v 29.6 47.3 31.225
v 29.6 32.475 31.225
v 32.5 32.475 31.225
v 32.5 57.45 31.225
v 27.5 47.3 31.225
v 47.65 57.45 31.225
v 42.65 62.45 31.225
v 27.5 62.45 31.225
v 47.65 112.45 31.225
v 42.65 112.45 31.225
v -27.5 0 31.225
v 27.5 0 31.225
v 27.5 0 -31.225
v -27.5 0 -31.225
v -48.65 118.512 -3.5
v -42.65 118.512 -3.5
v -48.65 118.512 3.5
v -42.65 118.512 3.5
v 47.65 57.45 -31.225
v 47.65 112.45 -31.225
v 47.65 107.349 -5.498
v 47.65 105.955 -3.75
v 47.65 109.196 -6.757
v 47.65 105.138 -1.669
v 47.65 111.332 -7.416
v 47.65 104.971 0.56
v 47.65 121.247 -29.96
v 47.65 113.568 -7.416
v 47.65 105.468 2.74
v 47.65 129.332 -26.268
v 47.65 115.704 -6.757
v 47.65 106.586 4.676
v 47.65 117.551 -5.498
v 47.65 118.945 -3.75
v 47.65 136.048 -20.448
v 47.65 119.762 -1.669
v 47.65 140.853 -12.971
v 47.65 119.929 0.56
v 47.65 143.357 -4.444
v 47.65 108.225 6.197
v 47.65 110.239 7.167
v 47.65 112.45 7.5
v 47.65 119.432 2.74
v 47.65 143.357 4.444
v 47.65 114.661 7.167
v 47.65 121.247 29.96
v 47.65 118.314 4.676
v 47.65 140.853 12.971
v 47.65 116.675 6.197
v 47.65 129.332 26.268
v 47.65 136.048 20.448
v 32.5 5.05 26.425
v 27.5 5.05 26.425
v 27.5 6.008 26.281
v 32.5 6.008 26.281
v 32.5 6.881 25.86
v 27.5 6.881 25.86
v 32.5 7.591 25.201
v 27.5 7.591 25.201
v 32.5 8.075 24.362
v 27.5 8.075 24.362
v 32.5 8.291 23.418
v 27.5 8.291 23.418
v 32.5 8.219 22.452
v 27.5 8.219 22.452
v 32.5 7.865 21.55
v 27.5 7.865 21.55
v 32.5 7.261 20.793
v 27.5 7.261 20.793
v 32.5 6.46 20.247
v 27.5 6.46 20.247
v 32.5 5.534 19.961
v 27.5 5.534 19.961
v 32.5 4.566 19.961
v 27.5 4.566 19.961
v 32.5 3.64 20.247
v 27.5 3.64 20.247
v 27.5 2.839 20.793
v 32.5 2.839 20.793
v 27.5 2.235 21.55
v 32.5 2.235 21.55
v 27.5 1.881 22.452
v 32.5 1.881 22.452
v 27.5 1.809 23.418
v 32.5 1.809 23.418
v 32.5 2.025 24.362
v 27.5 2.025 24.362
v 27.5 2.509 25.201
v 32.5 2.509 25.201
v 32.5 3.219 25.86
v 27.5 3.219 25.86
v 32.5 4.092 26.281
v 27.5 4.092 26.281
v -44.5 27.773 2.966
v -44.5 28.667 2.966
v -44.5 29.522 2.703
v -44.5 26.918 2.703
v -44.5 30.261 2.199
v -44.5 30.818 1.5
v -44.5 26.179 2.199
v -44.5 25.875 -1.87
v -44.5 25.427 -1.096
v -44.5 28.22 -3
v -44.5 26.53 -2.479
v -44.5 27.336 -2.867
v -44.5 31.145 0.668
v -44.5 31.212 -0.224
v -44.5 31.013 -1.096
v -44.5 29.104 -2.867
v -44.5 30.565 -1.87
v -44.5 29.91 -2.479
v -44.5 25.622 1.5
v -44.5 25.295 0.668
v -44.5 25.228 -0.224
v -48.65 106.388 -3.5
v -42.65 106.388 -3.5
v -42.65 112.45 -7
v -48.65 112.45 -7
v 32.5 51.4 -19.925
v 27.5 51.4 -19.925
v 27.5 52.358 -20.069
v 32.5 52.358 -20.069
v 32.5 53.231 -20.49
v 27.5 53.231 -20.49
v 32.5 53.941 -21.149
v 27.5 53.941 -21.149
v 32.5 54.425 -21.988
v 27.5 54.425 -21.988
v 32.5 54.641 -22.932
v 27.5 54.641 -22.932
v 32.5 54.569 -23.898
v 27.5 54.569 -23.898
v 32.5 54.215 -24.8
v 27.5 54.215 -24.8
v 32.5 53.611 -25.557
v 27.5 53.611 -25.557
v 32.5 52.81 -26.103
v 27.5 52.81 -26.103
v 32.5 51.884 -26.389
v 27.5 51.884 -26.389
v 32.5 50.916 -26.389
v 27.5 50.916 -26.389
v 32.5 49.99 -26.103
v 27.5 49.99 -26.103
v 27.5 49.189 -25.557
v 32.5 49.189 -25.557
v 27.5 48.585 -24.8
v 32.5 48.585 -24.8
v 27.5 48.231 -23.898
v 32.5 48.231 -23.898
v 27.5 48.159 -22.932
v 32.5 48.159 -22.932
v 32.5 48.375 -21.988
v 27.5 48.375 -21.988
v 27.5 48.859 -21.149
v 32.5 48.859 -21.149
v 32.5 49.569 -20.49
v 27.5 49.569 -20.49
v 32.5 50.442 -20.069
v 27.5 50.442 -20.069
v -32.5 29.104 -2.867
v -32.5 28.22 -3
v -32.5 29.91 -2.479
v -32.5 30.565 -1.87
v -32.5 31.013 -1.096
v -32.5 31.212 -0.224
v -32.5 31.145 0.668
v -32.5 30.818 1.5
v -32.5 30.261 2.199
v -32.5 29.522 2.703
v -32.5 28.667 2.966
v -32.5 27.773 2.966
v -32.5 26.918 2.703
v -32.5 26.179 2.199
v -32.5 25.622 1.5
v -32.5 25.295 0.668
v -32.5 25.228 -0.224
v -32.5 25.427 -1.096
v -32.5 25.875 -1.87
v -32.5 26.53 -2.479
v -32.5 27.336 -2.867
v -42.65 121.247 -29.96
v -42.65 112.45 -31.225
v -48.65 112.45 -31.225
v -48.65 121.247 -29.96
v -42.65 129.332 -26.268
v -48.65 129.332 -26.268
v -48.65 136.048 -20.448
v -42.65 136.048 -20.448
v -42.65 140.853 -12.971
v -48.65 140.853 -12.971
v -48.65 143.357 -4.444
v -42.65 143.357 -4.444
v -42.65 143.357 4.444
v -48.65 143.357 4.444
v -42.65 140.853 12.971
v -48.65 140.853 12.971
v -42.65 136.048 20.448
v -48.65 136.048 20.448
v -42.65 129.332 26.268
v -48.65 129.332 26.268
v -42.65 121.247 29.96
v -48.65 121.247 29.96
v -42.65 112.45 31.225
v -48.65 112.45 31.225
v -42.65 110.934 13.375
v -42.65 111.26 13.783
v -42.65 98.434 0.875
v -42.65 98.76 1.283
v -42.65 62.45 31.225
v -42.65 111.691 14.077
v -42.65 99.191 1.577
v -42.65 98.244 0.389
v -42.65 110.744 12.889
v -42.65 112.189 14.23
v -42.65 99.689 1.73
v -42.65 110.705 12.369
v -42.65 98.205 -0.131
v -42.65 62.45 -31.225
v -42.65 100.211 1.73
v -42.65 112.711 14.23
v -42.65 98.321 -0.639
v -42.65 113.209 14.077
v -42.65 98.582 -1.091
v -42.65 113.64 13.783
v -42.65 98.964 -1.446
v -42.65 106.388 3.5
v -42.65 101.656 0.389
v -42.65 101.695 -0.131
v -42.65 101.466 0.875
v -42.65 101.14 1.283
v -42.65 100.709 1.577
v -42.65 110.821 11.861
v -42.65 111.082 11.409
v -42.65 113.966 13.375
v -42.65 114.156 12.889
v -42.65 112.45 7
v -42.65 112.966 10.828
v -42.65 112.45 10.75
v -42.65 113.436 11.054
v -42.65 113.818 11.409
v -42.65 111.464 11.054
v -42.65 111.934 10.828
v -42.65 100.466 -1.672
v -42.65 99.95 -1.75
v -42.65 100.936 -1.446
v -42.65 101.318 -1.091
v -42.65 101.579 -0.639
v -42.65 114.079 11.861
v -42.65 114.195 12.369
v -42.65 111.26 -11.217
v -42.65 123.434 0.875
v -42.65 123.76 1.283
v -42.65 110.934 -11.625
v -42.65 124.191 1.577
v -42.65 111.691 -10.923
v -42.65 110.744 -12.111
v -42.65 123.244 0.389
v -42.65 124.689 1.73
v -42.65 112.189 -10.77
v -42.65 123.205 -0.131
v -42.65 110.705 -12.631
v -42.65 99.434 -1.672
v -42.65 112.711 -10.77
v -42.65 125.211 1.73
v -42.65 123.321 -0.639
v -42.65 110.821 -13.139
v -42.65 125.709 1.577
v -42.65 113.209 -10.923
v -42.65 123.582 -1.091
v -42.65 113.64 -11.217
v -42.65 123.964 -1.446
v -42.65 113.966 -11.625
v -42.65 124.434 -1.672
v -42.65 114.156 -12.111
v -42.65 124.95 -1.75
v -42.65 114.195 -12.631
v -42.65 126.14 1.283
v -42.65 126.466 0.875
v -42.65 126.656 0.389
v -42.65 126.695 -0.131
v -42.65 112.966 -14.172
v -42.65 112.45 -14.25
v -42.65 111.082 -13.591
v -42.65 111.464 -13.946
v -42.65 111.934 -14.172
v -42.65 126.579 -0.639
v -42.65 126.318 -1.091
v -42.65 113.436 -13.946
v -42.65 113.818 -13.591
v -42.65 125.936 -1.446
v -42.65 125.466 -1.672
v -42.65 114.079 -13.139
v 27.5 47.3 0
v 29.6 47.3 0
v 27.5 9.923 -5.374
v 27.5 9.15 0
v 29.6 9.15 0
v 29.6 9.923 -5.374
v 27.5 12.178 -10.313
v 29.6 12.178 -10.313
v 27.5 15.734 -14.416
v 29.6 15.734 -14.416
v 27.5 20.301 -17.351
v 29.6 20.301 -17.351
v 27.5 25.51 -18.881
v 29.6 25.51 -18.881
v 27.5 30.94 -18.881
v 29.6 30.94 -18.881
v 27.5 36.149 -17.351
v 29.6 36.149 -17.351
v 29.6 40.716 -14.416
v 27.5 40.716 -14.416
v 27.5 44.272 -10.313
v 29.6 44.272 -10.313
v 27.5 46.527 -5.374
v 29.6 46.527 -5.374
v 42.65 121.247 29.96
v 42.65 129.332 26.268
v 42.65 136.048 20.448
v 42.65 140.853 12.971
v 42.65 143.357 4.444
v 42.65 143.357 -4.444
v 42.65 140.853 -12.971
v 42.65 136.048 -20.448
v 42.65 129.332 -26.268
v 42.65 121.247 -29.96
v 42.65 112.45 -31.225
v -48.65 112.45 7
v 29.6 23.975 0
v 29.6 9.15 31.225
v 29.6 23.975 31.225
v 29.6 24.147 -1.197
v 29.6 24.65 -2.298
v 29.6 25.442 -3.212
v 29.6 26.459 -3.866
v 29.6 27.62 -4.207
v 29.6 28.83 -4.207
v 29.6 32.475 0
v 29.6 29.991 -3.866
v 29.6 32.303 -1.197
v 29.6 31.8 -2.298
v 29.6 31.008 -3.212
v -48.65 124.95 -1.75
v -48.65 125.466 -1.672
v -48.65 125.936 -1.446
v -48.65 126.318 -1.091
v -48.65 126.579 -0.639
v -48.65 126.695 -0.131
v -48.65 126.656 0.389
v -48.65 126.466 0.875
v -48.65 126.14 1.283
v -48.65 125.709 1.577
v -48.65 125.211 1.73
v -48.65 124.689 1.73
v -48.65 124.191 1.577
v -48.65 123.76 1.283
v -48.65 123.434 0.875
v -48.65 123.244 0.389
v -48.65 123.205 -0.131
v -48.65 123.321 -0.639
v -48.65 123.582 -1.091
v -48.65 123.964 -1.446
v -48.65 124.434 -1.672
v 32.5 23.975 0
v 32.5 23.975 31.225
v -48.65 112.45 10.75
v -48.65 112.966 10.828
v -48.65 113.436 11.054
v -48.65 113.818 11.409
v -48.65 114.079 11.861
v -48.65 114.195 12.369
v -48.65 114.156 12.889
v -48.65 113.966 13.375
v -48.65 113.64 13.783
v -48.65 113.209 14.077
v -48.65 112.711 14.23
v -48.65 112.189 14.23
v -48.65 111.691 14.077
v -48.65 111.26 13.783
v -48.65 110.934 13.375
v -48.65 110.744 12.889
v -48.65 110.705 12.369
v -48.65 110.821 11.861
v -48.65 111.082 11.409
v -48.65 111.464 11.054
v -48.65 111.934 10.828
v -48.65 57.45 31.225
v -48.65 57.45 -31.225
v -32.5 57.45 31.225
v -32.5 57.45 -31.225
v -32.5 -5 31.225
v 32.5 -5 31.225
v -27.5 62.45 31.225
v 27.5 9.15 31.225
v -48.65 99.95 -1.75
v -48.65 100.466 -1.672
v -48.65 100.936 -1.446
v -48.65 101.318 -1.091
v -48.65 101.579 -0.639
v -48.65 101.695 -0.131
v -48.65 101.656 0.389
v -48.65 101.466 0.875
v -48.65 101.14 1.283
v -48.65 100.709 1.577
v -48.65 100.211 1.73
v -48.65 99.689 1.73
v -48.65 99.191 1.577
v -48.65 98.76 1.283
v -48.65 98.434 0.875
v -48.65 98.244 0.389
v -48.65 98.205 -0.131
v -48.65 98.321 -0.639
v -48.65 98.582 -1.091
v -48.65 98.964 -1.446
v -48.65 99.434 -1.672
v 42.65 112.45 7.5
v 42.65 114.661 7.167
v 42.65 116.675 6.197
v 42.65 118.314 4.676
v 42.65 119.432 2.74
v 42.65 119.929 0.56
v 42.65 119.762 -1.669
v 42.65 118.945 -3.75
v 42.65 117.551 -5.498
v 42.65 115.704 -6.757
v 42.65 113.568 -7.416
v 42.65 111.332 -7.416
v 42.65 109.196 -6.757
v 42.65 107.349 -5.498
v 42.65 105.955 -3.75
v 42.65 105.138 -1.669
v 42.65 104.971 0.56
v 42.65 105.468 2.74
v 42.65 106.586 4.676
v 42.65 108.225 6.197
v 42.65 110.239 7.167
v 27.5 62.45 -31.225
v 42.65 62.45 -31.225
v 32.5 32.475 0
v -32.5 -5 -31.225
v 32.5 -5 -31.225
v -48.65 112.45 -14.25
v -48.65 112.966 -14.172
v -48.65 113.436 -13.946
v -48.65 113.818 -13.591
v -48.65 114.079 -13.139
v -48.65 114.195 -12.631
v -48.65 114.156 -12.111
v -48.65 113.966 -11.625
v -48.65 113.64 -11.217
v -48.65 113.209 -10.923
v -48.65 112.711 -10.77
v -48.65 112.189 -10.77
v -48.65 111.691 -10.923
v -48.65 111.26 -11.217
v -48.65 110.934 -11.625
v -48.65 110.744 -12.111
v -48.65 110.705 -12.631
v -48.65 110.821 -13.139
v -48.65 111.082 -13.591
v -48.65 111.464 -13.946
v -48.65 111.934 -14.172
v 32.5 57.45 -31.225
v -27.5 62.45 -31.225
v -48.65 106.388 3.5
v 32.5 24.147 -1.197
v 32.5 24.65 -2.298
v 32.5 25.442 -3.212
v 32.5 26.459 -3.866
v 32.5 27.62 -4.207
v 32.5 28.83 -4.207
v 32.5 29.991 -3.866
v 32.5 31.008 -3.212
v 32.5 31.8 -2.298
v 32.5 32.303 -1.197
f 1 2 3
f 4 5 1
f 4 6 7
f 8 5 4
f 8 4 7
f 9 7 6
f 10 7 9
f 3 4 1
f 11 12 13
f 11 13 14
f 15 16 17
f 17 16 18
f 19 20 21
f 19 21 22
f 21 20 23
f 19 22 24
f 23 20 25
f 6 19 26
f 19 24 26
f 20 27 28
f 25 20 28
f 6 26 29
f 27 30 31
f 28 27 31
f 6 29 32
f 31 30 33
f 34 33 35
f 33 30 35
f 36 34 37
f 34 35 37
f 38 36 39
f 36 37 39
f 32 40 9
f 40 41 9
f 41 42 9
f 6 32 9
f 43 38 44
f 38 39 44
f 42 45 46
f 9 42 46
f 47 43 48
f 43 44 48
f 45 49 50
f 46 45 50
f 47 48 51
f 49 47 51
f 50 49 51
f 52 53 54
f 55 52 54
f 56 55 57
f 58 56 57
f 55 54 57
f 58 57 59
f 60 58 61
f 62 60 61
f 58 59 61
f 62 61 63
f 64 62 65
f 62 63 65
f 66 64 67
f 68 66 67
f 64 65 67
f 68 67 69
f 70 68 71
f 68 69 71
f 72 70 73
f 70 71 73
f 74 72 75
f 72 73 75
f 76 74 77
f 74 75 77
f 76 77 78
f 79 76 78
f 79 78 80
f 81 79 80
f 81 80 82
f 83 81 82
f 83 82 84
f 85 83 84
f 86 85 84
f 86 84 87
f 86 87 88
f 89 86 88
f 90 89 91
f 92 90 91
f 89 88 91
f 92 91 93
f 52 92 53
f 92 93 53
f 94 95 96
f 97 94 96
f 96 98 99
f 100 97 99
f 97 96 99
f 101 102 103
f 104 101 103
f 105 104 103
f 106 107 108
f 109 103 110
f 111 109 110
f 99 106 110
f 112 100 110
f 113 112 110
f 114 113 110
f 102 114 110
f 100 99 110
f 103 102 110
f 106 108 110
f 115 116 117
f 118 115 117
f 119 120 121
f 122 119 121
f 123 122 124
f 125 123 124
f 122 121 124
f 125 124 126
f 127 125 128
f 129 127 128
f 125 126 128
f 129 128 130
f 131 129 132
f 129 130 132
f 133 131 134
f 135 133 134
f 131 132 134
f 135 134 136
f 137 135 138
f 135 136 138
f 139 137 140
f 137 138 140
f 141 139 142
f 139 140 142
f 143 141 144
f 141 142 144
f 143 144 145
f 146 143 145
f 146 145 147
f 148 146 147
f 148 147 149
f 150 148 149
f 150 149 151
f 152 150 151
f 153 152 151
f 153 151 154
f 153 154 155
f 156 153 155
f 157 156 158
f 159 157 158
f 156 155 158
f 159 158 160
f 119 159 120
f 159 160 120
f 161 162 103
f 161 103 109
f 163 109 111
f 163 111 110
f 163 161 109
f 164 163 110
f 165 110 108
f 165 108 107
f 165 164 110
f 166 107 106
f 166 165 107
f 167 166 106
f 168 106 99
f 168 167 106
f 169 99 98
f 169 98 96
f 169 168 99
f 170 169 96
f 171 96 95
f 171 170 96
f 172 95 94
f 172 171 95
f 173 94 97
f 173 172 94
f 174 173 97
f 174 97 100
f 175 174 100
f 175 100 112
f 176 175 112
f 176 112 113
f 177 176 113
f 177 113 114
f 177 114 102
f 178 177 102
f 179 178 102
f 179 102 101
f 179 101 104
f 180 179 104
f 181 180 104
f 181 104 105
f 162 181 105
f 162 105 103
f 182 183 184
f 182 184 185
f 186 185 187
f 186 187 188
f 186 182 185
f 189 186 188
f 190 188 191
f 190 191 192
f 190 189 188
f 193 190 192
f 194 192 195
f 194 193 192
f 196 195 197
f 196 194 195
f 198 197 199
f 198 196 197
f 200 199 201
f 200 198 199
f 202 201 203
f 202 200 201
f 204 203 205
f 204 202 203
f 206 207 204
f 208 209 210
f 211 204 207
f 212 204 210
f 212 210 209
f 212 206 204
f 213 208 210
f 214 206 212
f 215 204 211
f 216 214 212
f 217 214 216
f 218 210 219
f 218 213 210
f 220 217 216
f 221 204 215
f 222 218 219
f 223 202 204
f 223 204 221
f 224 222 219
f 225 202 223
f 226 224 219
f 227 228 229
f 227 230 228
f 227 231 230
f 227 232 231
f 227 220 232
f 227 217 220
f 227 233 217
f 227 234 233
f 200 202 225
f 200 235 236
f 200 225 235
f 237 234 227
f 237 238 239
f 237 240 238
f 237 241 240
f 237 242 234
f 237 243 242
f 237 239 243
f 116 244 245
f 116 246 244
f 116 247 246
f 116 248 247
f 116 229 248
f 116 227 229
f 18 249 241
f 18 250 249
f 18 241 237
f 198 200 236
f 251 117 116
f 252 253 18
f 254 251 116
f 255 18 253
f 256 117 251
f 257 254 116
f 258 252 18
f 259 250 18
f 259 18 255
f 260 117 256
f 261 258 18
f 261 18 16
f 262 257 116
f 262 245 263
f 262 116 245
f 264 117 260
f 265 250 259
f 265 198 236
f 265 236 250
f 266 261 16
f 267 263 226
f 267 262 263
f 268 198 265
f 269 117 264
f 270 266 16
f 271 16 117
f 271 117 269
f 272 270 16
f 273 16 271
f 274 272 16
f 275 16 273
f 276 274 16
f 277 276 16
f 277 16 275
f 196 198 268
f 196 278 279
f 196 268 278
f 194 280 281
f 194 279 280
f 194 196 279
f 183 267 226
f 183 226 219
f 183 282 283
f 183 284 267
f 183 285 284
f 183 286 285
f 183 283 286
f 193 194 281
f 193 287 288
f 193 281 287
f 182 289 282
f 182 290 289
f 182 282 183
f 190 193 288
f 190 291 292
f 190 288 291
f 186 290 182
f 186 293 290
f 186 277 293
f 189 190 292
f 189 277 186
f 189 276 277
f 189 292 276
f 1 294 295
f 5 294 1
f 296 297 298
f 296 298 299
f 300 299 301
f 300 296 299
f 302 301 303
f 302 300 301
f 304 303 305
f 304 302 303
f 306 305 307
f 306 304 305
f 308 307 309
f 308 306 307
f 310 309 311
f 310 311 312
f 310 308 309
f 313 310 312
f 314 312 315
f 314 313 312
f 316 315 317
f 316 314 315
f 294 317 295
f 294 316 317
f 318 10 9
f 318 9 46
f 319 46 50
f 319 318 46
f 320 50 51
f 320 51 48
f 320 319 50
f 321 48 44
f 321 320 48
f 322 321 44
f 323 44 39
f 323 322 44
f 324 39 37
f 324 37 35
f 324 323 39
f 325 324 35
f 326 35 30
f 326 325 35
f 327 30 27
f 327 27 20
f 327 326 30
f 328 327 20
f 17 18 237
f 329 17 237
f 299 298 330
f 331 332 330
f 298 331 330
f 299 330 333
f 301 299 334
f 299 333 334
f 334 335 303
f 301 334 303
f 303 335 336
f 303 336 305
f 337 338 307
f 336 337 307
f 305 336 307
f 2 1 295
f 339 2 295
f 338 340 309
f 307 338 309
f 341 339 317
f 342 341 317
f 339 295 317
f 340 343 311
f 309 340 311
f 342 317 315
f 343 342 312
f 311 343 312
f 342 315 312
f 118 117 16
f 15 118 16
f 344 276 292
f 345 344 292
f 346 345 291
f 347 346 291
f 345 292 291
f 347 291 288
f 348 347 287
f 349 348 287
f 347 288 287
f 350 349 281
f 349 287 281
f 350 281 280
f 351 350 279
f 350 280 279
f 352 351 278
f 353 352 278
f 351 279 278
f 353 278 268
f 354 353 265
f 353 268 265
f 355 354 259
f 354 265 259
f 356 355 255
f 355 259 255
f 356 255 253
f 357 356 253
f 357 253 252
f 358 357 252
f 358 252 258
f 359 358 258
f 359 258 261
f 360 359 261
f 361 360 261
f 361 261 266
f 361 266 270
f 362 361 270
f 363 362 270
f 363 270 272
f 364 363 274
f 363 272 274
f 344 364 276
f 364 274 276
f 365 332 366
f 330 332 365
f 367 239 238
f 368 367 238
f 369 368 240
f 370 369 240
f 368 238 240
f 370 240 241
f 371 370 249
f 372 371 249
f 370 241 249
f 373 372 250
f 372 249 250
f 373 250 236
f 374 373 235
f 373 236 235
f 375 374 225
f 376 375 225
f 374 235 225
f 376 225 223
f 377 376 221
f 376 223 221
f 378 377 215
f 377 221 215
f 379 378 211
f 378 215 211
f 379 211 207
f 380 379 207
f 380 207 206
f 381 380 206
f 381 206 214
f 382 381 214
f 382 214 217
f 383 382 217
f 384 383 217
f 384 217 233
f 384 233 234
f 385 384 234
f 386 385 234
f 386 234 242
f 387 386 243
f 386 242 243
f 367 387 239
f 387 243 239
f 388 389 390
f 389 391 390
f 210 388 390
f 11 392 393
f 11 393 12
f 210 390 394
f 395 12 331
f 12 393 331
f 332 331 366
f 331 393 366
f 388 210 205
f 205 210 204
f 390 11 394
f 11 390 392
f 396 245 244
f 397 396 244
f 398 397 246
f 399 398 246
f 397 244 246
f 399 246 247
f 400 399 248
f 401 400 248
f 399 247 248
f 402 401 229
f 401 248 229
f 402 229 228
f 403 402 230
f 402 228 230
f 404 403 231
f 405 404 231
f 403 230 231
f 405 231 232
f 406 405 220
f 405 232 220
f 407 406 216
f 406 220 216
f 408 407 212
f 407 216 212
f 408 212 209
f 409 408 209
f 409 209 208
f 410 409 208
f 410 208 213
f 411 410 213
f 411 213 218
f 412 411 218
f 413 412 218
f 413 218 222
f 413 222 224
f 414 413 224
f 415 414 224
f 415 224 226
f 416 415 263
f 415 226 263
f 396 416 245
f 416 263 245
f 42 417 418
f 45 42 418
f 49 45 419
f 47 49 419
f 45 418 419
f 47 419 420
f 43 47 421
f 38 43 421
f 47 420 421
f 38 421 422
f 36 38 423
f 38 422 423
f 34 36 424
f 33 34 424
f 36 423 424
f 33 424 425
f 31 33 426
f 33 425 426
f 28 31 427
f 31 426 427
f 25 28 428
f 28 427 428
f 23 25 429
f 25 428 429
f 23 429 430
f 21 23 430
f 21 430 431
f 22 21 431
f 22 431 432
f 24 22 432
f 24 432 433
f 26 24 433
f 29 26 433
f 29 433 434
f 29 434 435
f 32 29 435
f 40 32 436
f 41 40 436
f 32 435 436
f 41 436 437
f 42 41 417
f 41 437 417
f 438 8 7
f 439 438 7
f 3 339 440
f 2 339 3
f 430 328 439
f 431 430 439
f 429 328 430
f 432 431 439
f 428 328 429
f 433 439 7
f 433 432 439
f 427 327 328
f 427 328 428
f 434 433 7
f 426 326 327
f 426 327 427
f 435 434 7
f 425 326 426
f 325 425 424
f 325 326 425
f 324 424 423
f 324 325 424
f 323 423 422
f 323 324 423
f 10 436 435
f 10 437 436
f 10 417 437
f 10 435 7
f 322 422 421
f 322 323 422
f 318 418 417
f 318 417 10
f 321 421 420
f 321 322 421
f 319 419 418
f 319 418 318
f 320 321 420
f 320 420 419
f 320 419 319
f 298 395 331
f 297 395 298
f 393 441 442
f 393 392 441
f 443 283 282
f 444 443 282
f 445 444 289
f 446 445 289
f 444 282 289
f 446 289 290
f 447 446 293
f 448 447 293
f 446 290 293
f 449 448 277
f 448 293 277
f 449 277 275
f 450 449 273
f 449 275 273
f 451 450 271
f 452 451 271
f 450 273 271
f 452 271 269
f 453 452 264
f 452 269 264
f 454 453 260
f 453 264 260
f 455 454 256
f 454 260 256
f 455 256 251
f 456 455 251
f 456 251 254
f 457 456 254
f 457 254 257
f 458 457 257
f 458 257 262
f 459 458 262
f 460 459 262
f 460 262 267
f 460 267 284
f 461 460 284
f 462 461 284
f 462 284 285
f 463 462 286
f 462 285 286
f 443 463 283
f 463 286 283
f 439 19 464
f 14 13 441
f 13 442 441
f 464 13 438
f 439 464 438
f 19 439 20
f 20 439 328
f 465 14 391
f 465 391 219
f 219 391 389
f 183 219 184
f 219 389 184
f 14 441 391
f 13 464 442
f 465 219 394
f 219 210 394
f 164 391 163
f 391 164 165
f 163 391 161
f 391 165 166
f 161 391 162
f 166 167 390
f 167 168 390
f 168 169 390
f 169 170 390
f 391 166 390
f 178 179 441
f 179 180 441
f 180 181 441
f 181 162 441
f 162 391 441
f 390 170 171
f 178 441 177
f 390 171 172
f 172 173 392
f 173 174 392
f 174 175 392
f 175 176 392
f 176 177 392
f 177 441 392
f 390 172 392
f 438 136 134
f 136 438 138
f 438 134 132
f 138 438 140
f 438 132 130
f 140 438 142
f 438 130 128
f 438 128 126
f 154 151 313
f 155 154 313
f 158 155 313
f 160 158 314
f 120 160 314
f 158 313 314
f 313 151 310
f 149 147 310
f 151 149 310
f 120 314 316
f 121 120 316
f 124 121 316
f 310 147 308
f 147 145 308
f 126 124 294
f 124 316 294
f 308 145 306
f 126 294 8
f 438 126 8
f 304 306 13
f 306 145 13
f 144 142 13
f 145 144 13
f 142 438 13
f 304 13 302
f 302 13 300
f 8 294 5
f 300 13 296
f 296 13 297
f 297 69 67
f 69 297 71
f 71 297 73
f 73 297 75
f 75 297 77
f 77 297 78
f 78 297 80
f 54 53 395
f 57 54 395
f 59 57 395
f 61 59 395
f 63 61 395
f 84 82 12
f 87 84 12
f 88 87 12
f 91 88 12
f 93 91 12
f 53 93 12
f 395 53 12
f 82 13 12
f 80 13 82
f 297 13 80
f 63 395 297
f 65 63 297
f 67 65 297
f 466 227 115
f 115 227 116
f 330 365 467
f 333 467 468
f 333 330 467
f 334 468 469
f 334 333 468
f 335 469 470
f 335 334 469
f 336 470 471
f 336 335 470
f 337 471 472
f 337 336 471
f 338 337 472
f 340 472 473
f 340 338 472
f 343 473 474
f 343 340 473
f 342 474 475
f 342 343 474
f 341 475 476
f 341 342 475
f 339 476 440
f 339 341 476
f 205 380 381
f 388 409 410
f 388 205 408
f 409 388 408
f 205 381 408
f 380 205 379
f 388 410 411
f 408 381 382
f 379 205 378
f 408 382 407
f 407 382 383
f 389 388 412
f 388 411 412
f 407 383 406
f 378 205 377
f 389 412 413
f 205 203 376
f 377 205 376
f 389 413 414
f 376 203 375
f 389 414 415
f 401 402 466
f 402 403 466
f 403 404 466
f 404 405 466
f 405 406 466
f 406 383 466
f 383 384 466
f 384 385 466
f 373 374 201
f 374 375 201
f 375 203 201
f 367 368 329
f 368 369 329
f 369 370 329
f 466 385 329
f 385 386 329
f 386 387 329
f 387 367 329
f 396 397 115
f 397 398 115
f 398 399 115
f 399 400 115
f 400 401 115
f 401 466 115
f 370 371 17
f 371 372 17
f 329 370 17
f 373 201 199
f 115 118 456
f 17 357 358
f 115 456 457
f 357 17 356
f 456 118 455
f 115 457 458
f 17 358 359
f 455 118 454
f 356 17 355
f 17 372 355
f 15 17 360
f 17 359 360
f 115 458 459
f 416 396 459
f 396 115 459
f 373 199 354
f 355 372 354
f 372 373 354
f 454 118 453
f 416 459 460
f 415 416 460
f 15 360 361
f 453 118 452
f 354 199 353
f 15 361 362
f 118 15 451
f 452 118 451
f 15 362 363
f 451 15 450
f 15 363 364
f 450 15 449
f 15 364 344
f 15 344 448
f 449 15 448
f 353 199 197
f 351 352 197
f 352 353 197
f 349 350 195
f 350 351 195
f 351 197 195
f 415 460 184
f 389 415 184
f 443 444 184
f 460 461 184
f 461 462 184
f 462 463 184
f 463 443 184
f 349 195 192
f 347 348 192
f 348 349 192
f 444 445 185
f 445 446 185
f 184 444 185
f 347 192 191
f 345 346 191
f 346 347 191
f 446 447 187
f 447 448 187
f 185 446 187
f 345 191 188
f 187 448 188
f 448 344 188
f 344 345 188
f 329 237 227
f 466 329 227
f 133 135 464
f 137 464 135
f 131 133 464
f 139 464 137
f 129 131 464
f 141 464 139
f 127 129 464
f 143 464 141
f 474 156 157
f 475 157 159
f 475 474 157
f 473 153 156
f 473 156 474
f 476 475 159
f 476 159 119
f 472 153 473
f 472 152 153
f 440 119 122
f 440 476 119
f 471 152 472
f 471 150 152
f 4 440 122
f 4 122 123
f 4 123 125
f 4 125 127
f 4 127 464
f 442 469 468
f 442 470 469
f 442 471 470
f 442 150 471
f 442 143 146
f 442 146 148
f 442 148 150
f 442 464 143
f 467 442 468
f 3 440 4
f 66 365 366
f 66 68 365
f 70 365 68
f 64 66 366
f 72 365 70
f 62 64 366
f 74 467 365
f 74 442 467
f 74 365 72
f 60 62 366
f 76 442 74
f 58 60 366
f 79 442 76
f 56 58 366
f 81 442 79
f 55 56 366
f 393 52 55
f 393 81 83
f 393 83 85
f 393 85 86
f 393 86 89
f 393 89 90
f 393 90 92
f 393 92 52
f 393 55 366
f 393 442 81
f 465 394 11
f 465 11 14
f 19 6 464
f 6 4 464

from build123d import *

# Parameters (mm, degrees)
BOSS_EXTRUDE1_DEPTH = 5
SKETCH2_W           = 5
SKETCH2_H           = 62.45
BOSS_EXTRUDE2_DEPTH = 67.45
SKETCH6_R           = 3.25
CUT_EXTRUDE4_DEPTH  = 5
CUT_EXTRUDE5_DEPTH  = 2.1
CUT_EXTRUDE6_DEPTH  = 5
SKETCH8_W           = 15.15
SKETCH8_H           = 5
BOSS_EXTRUDE3_DEPTH = 62.45
SKETCH9_W           = 62.45
SKETCH9_H           = 55
BOSS_EXTRUDE4_DEPTH = 6
SKETCH10_W          = 62.45
SKETCH10_H          = 55
BOSS_EXTRUDE5_DEPTH = 5
BOSS_EXTRUDE6_DEPTH = 6
CUT_EXTRUDE7_DEPTH  = 6
BOSS_EXTRUDE7_DEPTH = 5
SKETCH14_R          = 7.5
CUT_EXTRUDE8_DEPTH  = 5
SKETCH12_3_R        = 1.75
CUT_EXTRUDE9_DEPTH  = 6
SKETCH16_R          = 3
BOSS_EXTRUDE8_DEPTH = 17


with BuildPart() as part:
    # Sketch1 → Boss-Extrude1 (new body)
    with BuildSketch(Plane(origin=(0, 0, 0), x_dir=(1, 0, 0), z_dir=(0, 1, 0))):
        Polygon((-27.5, 0), (-27.5, 31.225), (27.5, 31.225), (27.5, -31.225), (-27.5, -31.225), align=None)
    extrude(amount=-BOSS_EXTRUDE1_DEPTH)

    # Sketch2 → Boss-Extrude2 (add)
    with BuildSketch(Plane.XZ.offset(5)):
        with Locations((30, 0)):
            Rectangle(SKETCH2_W, SKETCH2_H)
        with Locations((-30, 0)):
            Rectangle(SKETCH2_W, SKETCH2_H)
    extrude(amount=-BOSS_EXTRUDE2_DEPTH)

    # Sketch6 → Cut-Extrude4 (cut)
    with BuildSketch(Plane.ZY.offset(-27.5)):
        with Locations((-23.175, 51.4)):
            Circle(SKETCH6_R)
        with Locations((23.175, 5.05)):
            Circle(SKETCH6_R)
    extrude(amount=-CUT_EXTRUDE4_DEPTH, mode=Mode.SUBTRACT)

    # Sketch7 → Cut-Extrude5 (cut)
    with BuildSketch(Plane.ZY.offset(-27.5)):
        with BuildLine():
            Line((0, 47.3), (31.225, 47.3))
            Line((31.225, 47.3), (31.225, 9.15))
            Line((31.225, 9.15), (0, 9.15))
            ThreePointArc((0, 9.15), (-19.075, 28.225), (0, 47.3))
        make_face()
    extrude(amount=-CUT_EXTRUDE5_DEPTH, mode=Mode.SUBTRACT)

    # Sketch7<3> → Cut-Extrude6 (cut)
    with BuildSketch(Plane.ZY.offset(-27.5)):
        with BuildLine():
            Line((0, 32.475), (31.225, 32.475))
            Line((31.225, 32.475), (31.225, 23.975))
            Line((31.225, 23.975), (0, 23.975))
            ThreePointArc((0, 23.975), (-4.25, 28.225), (0, 32.475))
        make_face()
    extrude(amount=-CUT_EXTRUDE6_DEPTH, mode=Mode.SUBTRACT)

    # Sketch8 → Boss-Extrude3 (add)
    with BuildSketch(Plane(origin=(0, 0, -31.225), x_dir=(-1, 0, 0), z_dir=(0, 0, -1))):
        with Locations((35.075, 59.95)):
            Rectangle(SKETCH8_W, SKETCH8_H)
        with Locations((-35.075, 59.95)):
            Rectangle(SKETCH8_W, SKETCH8_H)
    extrude(amount=-BOSS_EXTRUDE3_DEPTH)

    # Sketch9 → Boss-Extrude4 (add)
    with BuildSketch(Plane.ZY.offset(42.65)):
        with Locations((0, 84.95)):
            Rectangle(SKETCH9_W, SKETCH9_H)
    extrude(amount=BOSS_EXTRUDE4_DEPTH)

    # Sketch10 → Boss-Extrude5 (add)
    with BuildSketch(Plane(origin=(42.65, 0, 0), x_dir=(0, 0, -1), z_dir=(1, 0, 0))):
        with Locations((0, 84.95)):
            Rectangle(SKETCH10_W, SKETCH10_H)
    extrude(amount=BOSS_EXTRUDE5_DEPTH)

    # Sketch11 → Boss-Extrude6 (add)
    with BuildSketch(Plane(origin=(-42.65, 0, 0), x_dir=(0, 0, -1), z_dir=(1, 0, 0))):
        with BuildLine():
            Line((-31.225, 112.45), (31.225, 112.45))
            ThreePointArc((31.225, 112.45), (0, 143.675), (-31.225, 112.45))
        make_face()
    extrude(amount=-BOSS_EXTRUDE6_DEPTH)

    # Sketch12 → Cut-Extrude7 (cut)
    with BuildSketch(Plane(origin=(-42.65, 0, 0), x_dir=(0, 0, -1), z_dir=(1, 0, 0))):
        Polygon((7, 112.45), (3.5, 118.512177826), (-3.5, 118.512177826), (-7, 112.45), (-3.5, 106.387822174), (3.5, 106.387822174), align=None)
    extrude(amount=-CUT_EXTRUDE7_DEPTH, mode=Mode.SUBTRACT)

    # Sketch13 → Boss-Extrude7 (add)
    with BuildSketch(Plane.ZY.offset(-42.65)):
        with BuildLine():
            Line((-31.225, 112.45), (31.225, 112.45))
            ThreePointArc((31.225, 112.45), (0, 143.675), (-31.225, 112.45))
        make_face()
    extrude(amount=-BOSS_EXTRUDE7_DEPTH)

    # Sketch14 → Cut-Extrude8 (cut)
    with BuildSketch(Plane.ZY.offset(-42.65)):
        with Locations((0, 112.45)):
            Circle(SKETCH14_R)
    extrude(amount=-CUT_EXTRUDE8_DEPTH, mode=Mode.SUBTRACT)

    # Sketch12<3> → Cut-Extrude9 (cut)
    with BuildSketch(Plane(origin=(-42.65, 0, 0), x_dir=(0, 0, -1), z_dir=(1, 0, 0))):
        with Locations((0, 124.95)):
            Circle(SKETCH12_3_R)
        with Locations((-12.5, 112.45)):
            Circle(SKETCH12_3_R)
        with Locations((0, 99.95)):
            Circle(SKETCH12_3_R)
        with Locations((12.5, 112.45)):
            Circle(SKETCH12_3_R)
    extrude(amount=-CUT_EXTRUDE9_DEPTH, mode=Mode.SUBTRACT)

    # Sketch16 → Boss-Extrude8 (add)
    with BuildSketch(Plane(origin=(-27.5, 0, 0), x_dir=(0, 0, -1), z_dir=(1, 0, 0))):
        with Locations((0, 28.22)):
            Circle(SKETCH16_R)
    extrude(amount=-BOSS_EXTRUDE8_DEPTH)


solid = part.part
